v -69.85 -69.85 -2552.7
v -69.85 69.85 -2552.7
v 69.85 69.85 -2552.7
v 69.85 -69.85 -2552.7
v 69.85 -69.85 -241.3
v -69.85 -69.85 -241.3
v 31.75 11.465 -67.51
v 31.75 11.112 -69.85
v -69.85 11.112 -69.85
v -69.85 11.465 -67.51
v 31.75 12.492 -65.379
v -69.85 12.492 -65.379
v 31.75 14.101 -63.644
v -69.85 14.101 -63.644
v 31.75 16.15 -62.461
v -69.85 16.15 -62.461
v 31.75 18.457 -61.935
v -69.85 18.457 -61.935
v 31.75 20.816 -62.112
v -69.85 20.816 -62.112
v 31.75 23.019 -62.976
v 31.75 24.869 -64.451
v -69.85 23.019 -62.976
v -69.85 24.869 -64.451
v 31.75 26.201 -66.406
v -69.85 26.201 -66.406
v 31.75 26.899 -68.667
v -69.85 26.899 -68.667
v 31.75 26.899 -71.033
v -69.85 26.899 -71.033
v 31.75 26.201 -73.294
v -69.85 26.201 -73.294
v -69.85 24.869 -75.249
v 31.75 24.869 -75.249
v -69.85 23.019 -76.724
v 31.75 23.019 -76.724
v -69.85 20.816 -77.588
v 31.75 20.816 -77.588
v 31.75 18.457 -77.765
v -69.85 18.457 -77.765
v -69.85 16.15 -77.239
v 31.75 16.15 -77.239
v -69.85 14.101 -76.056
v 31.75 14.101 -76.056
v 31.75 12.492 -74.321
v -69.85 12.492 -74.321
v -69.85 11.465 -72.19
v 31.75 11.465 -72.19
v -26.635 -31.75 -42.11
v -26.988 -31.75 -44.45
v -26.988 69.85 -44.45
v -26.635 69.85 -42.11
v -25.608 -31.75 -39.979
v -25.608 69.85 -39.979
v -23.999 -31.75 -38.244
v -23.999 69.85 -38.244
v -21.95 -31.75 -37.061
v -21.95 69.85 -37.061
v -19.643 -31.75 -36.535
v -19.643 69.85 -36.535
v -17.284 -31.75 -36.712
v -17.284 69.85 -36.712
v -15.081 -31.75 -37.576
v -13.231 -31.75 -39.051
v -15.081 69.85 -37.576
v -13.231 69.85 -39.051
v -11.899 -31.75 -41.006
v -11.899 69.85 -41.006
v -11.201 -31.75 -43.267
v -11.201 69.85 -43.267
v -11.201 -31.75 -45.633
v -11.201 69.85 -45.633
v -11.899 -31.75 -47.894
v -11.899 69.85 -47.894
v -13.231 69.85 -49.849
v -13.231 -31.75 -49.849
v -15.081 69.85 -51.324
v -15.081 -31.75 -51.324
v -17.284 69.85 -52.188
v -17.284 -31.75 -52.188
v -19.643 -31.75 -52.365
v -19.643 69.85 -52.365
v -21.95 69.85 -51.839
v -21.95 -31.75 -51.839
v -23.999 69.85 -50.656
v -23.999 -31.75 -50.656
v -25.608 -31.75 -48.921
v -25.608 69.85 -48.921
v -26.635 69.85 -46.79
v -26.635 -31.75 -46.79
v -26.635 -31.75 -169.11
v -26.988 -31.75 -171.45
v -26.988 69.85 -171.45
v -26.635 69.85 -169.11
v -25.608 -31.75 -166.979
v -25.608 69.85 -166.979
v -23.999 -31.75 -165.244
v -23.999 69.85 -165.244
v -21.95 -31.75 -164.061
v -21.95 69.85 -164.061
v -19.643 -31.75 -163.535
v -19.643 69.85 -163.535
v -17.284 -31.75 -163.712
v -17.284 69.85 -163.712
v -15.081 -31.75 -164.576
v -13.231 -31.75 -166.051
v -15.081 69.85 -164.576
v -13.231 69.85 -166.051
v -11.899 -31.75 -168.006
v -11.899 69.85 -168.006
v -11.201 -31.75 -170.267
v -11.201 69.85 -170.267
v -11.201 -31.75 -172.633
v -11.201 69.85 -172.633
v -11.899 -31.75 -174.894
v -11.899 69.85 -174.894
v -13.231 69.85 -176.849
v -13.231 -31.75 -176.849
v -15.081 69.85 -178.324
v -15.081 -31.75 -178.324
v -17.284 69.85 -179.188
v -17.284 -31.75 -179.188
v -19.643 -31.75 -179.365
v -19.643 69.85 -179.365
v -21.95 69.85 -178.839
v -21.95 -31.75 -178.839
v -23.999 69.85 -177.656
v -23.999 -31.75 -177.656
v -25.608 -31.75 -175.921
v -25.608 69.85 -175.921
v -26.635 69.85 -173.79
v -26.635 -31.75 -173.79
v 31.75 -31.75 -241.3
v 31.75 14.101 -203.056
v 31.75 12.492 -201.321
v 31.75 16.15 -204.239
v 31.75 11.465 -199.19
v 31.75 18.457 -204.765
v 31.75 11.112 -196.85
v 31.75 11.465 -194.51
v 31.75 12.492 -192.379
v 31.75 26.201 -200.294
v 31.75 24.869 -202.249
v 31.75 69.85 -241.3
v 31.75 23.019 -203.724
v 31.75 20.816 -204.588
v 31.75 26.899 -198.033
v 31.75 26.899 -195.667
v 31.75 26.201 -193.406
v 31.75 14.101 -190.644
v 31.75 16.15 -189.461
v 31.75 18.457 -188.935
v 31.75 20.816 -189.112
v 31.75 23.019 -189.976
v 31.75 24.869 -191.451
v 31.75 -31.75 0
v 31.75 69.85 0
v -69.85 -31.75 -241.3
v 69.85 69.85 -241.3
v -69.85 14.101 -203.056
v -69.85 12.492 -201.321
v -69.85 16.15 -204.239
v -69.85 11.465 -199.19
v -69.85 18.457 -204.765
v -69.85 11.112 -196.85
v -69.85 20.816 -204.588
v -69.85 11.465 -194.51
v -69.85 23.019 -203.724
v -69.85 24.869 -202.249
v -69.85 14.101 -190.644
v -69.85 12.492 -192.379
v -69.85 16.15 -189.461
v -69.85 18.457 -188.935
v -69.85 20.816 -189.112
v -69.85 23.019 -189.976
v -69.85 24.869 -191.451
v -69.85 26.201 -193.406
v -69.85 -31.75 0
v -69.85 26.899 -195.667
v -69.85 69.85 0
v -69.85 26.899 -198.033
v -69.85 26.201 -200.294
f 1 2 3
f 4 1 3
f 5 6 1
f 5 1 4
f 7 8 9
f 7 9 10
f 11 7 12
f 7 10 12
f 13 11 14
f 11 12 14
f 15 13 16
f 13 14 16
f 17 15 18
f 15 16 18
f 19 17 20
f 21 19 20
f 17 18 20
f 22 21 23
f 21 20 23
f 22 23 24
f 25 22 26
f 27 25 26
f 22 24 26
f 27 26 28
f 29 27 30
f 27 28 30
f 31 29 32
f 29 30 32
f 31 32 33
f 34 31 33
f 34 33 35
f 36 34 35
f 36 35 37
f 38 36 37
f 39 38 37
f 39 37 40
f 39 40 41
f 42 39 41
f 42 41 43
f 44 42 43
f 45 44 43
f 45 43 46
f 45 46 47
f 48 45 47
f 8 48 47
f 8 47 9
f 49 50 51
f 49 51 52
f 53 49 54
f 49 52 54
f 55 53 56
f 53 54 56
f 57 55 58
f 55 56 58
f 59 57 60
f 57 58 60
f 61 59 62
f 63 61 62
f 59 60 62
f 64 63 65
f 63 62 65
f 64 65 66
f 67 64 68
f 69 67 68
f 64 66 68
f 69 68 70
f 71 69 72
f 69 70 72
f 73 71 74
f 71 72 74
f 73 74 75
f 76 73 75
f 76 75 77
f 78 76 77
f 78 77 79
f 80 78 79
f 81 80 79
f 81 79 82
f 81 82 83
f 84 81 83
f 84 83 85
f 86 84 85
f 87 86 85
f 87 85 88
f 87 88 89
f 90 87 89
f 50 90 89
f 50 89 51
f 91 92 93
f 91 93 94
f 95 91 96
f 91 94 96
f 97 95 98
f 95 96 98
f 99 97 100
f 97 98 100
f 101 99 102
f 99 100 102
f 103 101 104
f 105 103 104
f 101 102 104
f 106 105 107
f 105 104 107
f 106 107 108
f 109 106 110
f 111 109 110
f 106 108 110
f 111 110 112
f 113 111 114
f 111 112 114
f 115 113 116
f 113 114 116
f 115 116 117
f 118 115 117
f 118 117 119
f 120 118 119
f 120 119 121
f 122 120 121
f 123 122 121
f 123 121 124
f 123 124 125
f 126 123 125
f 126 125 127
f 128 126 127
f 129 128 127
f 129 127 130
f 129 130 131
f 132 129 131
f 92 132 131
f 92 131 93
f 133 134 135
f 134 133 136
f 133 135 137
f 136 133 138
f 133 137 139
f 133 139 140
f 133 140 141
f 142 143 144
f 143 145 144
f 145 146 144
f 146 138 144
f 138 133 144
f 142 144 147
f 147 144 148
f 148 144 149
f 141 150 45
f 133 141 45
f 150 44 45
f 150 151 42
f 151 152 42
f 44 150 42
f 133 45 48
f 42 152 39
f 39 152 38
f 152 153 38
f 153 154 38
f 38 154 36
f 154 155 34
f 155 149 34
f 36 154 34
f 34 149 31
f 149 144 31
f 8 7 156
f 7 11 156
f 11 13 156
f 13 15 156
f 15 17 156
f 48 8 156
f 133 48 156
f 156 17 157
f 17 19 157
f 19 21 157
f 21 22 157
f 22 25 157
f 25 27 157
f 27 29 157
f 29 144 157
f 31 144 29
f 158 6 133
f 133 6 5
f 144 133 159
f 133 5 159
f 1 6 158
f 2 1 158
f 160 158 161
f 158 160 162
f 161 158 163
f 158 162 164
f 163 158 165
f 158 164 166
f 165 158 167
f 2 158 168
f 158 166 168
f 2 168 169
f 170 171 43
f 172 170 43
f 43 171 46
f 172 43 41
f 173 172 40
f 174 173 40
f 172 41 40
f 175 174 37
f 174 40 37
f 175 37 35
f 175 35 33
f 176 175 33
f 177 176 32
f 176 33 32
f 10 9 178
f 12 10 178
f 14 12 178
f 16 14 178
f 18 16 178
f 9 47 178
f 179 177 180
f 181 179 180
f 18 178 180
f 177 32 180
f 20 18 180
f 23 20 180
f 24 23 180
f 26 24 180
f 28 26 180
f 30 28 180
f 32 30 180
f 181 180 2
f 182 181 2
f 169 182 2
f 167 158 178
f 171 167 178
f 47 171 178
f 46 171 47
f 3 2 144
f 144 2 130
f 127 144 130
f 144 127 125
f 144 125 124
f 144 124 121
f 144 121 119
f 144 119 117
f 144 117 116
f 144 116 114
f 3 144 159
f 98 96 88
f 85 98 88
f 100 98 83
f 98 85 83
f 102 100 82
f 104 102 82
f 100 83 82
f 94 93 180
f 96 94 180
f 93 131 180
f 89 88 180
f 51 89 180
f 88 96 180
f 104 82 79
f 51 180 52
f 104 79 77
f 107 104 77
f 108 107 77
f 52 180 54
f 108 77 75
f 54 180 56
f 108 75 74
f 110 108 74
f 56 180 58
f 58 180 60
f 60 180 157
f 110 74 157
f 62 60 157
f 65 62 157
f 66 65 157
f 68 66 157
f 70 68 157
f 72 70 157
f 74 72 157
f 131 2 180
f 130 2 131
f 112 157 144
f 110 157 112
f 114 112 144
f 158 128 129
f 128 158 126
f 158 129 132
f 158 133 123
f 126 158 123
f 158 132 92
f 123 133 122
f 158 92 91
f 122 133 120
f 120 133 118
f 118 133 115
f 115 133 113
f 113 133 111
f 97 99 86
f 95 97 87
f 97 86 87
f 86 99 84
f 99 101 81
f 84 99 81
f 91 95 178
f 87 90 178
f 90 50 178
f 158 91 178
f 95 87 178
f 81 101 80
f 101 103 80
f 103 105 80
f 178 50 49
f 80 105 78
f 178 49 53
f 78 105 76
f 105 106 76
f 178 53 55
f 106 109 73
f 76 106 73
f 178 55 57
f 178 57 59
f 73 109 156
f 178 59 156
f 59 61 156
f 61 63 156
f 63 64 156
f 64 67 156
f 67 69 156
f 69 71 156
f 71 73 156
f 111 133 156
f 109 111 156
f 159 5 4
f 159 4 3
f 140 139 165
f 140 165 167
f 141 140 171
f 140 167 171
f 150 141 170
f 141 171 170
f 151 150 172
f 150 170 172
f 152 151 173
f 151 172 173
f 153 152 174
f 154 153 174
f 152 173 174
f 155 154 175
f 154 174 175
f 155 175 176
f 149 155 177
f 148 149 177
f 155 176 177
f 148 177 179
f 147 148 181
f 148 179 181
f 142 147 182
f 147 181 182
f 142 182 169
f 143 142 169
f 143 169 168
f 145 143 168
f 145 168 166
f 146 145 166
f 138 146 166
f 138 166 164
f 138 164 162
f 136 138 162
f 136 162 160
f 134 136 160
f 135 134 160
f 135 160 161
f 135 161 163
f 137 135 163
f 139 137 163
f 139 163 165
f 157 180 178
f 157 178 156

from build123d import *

# Parameters (mm, degrees)
F0_W          = 139.7
F0_H          = 139.7
F1_DEPTH      = 2552.7
F2_W          = 38.1
F2_H          = 241.3
F3_DEPTH      = 69.851
F3_DEPTH_BACK = 69.851
F4_W          = 38.1
F4_H          = 241.3
F5_DEPTH      = 69.851
F5_DEPTH_BACK = 69.851
F7_D          = 15.875
F9_D          = 15.875


with BuildPart() as f1:
    # F0 (on Top) → F1 (new body)
    with BuildSketch(Plane.XY):
        Rectangle(F0_W, F0_H)
    extrude(amount=-F1_DEPTH)

    # F2 (on Front) → F3 (cut, two sides)
    with BuildSketch(Plane.XZ) as f3_sk:
        with Locations((50.8, -120.65)):
            Rectangle(F2_W, F2_H)
    extrude(amount=F3_DEPTH, mode=Mode.SUBTRACT)
    extrude(f3_sk.sketch, amount=-F3_DEPTH_BACK, mode=Mode.SUBTRACT)

    # F4 (on Right) → F5 (cut, two sides)
    with BuildSketch(Plane.YZ) as f5_sk:
        with Locations((-50.8, -120.65)):
            Rectangle(F4_W, F4_H)
    extrude(amount=F5_DEPTH, mode=Mode.SUBTRACT)
    extrude(f5_sk.sketch, amount=-F5_DEPTH_BACK, mode=Mode.SUBTRACT)

    # F7 (through all)
    with Locations(Plane.XZ.offset(31.75)):
        with Locations((-19.05, -44.45), (-19.05, -171.45)):
            Hole(F7_D / 2)

    # F9 (through all)
    with Locations(Plane.YZ.offset(31.75)):
        with Locations((19.05, -69.85), (19.05, -196.85)):
            Hole(F9_D / 2)


solid = f1.part
